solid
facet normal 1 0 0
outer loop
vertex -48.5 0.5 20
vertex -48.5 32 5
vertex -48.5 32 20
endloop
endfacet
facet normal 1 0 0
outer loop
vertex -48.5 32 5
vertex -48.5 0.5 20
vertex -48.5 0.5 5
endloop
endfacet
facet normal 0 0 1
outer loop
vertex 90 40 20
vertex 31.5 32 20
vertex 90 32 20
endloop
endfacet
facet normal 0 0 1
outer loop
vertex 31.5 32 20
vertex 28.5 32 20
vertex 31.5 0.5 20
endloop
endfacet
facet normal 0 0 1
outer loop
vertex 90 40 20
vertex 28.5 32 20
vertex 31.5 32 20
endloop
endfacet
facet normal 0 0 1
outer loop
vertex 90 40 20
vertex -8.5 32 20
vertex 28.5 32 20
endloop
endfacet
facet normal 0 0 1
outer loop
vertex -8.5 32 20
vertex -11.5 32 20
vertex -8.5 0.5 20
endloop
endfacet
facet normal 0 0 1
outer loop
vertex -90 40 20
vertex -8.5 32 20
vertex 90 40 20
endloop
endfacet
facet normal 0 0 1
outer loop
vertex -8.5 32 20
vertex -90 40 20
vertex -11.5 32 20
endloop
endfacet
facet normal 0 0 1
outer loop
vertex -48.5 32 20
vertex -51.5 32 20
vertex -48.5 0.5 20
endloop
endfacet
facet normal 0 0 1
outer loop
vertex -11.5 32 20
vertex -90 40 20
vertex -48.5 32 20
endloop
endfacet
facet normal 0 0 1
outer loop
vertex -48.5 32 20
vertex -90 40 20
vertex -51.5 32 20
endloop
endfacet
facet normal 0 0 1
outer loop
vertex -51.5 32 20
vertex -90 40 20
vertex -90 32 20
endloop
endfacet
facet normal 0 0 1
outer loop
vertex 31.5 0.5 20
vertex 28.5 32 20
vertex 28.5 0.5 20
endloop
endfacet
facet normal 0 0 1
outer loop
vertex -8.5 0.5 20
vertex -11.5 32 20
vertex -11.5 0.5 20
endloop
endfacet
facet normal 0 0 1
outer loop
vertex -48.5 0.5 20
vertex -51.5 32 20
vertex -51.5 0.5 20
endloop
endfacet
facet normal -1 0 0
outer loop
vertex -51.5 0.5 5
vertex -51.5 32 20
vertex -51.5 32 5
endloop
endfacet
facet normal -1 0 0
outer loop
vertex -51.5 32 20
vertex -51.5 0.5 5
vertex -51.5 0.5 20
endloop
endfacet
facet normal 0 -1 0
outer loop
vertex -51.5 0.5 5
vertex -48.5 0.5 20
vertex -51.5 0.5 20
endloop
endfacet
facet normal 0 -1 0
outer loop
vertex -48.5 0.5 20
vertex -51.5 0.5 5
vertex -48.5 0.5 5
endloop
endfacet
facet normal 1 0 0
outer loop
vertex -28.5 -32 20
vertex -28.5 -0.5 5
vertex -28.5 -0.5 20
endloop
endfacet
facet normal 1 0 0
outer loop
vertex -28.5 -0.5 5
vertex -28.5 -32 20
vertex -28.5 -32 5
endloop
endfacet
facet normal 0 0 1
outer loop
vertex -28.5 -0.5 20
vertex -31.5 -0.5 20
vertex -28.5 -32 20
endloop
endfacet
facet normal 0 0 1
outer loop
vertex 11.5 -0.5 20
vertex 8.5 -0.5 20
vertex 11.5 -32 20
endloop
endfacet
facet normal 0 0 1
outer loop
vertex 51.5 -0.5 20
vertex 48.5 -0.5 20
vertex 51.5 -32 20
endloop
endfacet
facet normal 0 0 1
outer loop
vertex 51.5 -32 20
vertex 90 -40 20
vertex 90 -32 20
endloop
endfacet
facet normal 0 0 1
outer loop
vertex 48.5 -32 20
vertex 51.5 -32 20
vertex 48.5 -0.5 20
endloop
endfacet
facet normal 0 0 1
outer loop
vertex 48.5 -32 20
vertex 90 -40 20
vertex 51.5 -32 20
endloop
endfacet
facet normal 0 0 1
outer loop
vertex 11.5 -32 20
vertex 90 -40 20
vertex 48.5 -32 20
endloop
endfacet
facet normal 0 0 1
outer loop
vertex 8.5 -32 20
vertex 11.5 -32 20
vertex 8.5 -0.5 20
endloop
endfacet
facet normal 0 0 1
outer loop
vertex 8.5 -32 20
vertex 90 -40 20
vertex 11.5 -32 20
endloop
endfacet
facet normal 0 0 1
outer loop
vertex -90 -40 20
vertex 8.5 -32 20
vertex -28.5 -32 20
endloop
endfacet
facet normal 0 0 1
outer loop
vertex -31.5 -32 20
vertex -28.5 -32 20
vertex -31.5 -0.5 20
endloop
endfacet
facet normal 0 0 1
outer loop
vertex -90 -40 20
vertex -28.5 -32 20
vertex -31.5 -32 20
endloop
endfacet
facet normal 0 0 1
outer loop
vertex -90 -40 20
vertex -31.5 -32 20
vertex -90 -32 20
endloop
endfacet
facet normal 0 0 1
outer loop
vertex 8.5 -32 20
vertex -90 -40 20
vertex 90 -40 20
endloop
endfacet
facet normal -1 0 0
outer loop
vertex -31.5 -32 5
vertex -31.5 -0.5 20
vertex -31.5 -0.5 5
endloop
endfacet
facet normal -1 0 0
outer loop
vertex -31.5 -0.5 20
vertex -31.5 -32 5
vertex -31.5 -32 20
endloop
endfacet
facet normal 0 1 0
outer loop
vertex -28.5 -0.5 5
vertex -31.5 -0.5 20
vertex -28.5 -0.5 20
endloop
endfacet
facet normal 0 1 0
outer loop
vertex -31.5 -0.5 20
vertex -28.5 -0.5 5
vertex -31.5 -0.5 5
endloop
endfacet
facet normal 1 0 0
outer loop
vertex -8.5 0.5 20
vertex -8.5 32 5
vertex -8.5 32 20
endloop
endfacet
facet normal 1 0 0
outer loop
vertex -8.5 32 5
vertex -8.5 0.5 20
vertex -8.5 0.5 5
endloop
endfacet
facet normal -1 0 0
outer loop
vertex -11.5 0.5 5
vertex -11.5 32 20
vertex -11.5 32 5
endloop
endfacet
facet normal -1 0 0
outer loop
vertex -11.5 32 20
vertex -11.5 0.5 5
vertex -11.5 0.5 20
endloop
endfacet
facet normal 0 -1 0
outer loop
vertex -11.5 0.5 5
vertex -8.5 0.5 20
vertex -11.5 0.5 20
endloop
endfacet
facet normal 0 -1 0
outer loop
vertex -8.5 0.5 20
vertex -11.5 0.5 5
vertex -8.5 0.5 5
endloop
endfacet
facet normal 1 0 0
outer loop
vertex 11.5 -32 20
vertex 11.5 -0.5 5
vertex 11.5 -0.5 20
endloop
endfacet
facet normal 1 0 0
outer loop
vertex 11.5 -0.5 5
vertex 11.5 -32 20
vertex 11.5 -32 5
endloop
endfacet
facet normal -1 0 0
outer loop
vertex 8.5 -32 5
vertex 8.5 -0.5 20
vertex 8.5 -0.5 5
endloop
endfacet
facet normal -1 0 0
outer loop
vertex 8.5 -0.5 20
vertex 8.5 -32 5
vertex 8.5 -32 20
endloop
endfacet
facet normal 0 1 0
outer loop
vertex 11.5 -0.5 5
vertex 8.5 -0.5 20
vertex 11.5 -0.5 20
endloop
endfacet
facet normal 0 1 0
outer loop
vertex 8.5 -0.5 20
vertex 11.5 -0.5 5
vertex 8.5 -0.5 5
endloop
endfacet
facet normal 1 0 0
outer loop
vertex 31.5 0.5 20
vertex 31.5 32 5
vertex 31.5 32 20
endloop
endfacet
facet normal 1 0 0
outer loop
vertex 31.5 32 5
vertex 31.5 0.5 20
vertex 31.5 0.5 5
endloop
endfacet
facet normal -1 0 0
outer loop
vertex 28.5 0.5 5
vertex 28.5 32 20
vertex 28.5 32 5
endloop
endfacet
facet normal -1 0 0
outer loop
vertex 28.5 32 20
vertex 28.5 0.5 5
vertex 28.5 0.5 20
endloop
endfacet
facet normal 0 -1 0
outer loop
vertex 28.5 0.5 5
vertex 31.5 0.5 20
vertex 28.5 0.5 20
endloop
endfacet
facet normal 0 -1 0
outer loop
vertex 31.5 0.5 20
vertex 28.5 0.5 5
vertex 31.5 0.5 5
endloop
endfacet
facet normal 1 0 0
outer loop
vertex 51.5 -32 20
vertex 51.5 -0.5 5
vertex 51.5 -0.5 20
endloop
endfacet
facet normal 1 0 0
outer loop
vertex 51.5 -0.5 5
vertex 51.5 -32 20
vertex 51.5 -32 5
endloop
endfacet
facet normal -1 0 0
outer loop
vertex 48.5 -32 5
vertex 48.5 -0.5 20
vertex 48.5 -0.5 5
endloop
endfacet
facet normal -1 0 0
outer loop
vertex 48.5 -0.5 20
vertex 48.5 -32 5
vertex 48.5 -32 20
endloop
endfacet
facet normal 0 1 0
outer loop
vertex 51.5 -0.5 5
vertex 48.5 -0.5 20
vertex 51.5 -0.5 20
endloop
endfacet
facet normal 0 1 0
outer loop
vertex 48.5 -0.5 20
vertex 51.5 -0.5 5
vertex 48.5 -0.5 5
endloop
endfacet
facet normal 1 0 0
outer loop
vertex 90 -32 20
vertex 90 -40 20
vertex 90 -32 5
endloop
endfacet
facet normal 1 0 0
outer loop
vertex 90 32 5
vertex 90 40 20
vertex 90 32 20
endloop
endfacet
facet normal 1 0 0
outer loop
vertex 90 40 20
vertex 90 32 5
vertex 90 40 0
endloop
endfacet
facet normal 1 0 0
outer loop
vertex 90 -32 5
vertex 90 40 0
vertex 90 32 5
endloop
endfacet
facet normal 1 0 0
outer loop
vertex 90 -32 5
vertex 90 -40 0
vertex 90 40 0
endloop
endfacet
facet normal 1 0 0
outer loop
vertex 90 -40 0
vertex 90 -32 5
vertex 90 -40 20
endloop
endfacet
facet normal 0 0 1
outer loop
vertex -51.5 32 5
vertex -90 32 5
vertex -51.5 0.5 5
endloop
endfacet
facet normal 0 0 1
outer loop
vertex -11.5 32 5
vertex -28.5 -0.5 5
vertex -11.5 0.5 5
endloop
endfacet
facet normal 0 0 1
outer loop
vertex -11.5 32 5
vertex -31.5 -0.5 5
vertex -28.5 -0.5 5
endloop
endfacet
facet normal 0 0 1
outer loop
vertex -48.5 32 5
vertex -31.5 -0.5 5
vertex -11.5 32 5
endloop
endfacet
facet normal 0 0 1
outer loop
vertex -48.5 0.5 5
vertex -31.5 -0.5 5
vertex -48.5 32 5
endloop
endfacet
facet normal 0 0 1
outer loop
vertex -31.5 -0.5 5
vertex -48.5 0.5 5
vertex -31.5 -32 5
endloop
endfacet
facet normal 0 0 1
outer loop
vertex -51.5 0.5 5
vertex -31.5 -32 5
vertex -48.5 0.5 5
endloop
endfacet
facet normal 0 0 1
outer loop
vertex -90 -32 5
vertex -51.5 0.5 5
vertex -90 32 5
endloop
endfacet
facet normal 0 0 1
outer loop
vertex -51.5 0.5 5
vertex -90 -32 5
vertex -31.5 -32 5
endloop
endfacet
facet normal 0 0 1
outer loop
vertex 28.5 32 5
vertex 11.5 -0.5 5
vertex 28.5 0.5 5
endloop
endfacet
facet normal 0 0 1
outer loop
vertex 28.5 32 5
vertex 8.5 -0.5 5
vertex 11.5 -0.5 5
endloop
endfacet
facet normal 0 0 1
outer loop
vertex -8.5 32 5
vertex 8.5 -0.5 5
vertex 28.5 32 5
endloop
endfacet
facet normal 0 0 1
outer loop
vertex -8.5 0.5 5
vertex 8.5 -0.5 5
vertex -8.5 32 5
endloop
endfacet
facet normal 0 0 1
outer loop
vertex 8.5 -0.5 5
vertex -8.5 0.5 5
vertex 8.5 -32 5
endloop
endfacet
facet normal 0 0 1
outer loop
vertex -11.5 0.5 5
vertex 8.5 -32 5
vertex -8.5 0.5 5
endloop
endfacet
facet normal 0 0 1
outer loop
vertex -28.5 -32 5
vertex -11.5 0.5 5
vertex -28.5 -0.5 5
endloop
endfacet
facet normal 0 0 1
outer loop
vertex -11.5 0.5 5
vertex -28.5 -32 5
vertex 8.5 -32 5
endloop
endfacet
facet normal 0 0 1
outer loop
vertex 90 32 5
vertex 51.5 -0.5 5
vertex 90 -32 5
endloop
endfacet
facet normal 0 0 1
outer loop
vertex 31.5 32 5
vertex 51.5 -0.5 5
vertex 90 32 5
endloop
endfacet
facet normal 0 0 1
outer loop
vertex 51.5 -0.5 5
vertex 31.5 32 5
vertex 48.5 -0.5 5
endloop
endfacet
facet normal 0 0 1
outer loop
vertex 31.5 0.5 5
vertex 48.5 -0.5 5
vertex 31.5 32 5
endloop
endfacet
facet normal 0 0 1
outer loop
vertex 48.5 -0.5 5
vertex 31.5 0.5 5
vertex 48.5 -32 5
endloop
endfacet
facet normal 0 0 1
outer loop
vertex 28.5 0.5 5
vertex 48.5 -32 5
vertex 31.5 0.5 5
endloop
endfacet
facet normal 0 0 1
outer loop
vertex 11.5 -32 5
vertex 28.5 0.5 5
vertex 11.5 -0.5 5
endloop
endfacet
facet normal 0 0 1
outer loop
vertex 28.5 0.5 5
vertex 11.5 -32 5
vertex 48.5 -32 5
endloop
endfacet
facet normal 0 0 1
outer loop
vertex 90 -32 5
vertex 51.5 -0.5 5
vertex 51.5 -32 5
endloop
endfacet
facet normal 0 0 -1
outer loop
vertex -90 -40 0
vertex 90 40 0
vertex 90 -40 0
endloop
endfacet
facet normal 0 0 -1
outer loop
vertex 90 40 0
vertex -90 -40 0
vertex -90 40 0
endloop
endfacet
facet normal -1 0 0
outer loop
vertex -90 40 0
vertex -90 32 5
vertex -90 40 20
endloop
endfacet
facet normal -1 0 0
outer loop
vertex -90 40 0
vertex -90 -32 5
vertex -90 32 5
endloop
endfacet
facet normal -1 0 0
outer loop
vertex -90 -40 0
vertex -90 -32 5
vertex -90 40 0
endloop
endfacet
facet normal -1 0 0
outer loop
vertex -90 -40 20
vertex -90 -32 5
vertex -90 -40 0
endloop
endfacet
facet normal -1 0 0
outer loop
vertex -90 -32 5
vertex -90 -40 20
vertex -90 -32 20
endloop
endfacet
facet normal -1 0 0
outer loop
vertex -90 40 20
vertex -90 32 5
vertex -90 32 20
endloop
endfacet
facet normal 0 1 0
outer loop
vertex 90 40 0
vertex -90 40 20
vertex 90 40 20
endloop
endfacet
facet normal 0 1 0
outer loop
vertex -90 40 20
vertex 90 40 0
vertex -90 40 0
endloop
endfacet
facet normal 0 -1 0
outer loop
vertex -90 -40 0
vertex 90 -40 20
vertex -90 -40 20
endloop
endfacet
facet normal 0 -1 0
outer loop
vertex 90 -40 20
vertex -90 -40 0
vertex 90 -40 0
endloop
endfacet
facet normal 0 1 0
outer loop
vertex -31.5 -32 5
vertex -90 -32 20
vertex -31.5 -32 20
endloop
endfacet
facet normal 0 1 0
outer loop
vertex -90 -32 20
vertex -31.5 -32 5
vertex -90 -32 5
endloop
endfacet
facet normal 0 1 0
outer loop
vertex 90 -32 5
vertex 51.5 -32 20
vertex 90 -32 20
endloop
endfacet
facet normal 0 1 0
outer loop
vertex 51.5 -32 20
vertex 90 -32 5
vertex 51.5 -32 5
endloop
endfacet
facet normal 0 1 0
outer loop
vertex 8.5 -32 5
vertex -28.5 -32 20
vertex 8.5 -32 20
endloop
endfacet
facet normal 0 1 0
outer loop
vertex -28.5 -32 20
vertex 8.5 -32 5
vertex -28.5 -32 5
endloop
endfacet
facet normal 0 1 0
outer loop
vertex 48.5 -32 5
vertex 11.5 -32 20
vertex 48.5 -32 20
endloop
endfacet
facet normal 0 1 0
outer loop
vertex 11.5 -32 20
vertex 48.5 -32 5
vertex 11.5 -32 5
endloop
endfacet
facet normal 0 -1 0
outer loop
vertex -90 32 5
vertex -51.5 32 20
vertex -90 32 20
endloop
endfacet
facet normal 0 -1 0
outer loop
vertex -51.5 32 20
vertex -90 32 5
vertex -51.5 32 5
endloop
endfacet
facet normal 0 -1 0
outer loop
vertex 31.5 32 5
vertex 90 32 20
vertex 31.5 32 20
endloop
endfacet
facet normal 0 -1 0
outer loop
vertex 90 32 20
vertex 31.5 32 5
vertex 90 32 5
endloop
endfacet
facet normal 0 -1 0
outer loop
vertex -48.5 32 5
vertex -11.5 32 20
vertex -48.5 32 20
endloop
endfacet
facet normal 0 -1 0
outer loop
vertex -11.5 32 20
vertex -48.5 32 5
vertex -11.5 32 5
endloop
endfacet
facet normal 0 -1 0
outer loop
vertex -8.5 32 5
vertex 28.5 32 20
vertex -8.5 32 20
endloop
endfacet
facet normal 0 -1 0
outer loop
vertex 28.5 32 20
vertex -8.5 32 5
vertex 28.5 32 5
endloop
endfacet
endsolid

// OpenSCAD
$fn = 32;

// ----------------------------------------------------------------------
// Rib frame 180 x 80 x 20
// 6 ribs at 20 mm pitch, staggered
// ----------------------------------------------------------------------

// --- parameters (mm) ---
frame = [180, 80, 5];  // base plate size (x, y, z)
seat_tol = 0.1;        // tolerance at the seating features
free_tol = 0.3;        // general tolerance on the free sizes
rail_w = 8;            // side rail width
ribs = 6;              // number of ribs
rib_t = 3;             // rib thickness
rib_h = 15;            // rib height above the base plate
pitch = 20;            // pitch between rib centres

// --- derived feature positions (mm) ---
span = (ribs - 1) * pitch;          // = 100   distance between the outer ribs
origin_x = -span / 2;               // = -50   X of the first rib
rib_len = frame[1] / 2 - rail_w + 0.5;  // = 32.5   length of a staggered rib
rib_y = 0.5 + rib_len / 2;          // = 16.75   Y of a staggered rib centre
row_offset = 2 * rib_y;             // = 33.5   distance between the two rows
feature_centers = [
  [origin_x + 0 * pitch, rib_y],
  [origin_x + 1 * pitch, -rib_y],
  [origin_x + 2 * pitch, rib_y],
  [origin_x + 3 * pitch, -rib_y],
  [origin_x + 4 * pitch, rib_y],
  [origin_x + 5 * pitch, -rib_y]
];   // rib centre line, drives the rib loop

// base plate, two side rails, then the ribs read straight off feature_centers
union() {
  translate([-frame[0] / 2, -frame[1] / 2, 0]) cube(frame);
  translate([-frame[0] / 2, -frame[1] / 2, 0]) cube([frame[0], rail_w, frame[2] + rib_h]);
  translate([-frame[0] / 2, frame[1] / 2 - rail_w, 0]) cube([frame[0], rail_w, frame[2] + rib_h]);
  for (centre = feature_centers)
    translate([centre[0] - rib_t / 2, centre[1] - rib_len / 2, frame[2] - 1])
      cube([rib_t, rib_len, rib_h + 1]);
}
